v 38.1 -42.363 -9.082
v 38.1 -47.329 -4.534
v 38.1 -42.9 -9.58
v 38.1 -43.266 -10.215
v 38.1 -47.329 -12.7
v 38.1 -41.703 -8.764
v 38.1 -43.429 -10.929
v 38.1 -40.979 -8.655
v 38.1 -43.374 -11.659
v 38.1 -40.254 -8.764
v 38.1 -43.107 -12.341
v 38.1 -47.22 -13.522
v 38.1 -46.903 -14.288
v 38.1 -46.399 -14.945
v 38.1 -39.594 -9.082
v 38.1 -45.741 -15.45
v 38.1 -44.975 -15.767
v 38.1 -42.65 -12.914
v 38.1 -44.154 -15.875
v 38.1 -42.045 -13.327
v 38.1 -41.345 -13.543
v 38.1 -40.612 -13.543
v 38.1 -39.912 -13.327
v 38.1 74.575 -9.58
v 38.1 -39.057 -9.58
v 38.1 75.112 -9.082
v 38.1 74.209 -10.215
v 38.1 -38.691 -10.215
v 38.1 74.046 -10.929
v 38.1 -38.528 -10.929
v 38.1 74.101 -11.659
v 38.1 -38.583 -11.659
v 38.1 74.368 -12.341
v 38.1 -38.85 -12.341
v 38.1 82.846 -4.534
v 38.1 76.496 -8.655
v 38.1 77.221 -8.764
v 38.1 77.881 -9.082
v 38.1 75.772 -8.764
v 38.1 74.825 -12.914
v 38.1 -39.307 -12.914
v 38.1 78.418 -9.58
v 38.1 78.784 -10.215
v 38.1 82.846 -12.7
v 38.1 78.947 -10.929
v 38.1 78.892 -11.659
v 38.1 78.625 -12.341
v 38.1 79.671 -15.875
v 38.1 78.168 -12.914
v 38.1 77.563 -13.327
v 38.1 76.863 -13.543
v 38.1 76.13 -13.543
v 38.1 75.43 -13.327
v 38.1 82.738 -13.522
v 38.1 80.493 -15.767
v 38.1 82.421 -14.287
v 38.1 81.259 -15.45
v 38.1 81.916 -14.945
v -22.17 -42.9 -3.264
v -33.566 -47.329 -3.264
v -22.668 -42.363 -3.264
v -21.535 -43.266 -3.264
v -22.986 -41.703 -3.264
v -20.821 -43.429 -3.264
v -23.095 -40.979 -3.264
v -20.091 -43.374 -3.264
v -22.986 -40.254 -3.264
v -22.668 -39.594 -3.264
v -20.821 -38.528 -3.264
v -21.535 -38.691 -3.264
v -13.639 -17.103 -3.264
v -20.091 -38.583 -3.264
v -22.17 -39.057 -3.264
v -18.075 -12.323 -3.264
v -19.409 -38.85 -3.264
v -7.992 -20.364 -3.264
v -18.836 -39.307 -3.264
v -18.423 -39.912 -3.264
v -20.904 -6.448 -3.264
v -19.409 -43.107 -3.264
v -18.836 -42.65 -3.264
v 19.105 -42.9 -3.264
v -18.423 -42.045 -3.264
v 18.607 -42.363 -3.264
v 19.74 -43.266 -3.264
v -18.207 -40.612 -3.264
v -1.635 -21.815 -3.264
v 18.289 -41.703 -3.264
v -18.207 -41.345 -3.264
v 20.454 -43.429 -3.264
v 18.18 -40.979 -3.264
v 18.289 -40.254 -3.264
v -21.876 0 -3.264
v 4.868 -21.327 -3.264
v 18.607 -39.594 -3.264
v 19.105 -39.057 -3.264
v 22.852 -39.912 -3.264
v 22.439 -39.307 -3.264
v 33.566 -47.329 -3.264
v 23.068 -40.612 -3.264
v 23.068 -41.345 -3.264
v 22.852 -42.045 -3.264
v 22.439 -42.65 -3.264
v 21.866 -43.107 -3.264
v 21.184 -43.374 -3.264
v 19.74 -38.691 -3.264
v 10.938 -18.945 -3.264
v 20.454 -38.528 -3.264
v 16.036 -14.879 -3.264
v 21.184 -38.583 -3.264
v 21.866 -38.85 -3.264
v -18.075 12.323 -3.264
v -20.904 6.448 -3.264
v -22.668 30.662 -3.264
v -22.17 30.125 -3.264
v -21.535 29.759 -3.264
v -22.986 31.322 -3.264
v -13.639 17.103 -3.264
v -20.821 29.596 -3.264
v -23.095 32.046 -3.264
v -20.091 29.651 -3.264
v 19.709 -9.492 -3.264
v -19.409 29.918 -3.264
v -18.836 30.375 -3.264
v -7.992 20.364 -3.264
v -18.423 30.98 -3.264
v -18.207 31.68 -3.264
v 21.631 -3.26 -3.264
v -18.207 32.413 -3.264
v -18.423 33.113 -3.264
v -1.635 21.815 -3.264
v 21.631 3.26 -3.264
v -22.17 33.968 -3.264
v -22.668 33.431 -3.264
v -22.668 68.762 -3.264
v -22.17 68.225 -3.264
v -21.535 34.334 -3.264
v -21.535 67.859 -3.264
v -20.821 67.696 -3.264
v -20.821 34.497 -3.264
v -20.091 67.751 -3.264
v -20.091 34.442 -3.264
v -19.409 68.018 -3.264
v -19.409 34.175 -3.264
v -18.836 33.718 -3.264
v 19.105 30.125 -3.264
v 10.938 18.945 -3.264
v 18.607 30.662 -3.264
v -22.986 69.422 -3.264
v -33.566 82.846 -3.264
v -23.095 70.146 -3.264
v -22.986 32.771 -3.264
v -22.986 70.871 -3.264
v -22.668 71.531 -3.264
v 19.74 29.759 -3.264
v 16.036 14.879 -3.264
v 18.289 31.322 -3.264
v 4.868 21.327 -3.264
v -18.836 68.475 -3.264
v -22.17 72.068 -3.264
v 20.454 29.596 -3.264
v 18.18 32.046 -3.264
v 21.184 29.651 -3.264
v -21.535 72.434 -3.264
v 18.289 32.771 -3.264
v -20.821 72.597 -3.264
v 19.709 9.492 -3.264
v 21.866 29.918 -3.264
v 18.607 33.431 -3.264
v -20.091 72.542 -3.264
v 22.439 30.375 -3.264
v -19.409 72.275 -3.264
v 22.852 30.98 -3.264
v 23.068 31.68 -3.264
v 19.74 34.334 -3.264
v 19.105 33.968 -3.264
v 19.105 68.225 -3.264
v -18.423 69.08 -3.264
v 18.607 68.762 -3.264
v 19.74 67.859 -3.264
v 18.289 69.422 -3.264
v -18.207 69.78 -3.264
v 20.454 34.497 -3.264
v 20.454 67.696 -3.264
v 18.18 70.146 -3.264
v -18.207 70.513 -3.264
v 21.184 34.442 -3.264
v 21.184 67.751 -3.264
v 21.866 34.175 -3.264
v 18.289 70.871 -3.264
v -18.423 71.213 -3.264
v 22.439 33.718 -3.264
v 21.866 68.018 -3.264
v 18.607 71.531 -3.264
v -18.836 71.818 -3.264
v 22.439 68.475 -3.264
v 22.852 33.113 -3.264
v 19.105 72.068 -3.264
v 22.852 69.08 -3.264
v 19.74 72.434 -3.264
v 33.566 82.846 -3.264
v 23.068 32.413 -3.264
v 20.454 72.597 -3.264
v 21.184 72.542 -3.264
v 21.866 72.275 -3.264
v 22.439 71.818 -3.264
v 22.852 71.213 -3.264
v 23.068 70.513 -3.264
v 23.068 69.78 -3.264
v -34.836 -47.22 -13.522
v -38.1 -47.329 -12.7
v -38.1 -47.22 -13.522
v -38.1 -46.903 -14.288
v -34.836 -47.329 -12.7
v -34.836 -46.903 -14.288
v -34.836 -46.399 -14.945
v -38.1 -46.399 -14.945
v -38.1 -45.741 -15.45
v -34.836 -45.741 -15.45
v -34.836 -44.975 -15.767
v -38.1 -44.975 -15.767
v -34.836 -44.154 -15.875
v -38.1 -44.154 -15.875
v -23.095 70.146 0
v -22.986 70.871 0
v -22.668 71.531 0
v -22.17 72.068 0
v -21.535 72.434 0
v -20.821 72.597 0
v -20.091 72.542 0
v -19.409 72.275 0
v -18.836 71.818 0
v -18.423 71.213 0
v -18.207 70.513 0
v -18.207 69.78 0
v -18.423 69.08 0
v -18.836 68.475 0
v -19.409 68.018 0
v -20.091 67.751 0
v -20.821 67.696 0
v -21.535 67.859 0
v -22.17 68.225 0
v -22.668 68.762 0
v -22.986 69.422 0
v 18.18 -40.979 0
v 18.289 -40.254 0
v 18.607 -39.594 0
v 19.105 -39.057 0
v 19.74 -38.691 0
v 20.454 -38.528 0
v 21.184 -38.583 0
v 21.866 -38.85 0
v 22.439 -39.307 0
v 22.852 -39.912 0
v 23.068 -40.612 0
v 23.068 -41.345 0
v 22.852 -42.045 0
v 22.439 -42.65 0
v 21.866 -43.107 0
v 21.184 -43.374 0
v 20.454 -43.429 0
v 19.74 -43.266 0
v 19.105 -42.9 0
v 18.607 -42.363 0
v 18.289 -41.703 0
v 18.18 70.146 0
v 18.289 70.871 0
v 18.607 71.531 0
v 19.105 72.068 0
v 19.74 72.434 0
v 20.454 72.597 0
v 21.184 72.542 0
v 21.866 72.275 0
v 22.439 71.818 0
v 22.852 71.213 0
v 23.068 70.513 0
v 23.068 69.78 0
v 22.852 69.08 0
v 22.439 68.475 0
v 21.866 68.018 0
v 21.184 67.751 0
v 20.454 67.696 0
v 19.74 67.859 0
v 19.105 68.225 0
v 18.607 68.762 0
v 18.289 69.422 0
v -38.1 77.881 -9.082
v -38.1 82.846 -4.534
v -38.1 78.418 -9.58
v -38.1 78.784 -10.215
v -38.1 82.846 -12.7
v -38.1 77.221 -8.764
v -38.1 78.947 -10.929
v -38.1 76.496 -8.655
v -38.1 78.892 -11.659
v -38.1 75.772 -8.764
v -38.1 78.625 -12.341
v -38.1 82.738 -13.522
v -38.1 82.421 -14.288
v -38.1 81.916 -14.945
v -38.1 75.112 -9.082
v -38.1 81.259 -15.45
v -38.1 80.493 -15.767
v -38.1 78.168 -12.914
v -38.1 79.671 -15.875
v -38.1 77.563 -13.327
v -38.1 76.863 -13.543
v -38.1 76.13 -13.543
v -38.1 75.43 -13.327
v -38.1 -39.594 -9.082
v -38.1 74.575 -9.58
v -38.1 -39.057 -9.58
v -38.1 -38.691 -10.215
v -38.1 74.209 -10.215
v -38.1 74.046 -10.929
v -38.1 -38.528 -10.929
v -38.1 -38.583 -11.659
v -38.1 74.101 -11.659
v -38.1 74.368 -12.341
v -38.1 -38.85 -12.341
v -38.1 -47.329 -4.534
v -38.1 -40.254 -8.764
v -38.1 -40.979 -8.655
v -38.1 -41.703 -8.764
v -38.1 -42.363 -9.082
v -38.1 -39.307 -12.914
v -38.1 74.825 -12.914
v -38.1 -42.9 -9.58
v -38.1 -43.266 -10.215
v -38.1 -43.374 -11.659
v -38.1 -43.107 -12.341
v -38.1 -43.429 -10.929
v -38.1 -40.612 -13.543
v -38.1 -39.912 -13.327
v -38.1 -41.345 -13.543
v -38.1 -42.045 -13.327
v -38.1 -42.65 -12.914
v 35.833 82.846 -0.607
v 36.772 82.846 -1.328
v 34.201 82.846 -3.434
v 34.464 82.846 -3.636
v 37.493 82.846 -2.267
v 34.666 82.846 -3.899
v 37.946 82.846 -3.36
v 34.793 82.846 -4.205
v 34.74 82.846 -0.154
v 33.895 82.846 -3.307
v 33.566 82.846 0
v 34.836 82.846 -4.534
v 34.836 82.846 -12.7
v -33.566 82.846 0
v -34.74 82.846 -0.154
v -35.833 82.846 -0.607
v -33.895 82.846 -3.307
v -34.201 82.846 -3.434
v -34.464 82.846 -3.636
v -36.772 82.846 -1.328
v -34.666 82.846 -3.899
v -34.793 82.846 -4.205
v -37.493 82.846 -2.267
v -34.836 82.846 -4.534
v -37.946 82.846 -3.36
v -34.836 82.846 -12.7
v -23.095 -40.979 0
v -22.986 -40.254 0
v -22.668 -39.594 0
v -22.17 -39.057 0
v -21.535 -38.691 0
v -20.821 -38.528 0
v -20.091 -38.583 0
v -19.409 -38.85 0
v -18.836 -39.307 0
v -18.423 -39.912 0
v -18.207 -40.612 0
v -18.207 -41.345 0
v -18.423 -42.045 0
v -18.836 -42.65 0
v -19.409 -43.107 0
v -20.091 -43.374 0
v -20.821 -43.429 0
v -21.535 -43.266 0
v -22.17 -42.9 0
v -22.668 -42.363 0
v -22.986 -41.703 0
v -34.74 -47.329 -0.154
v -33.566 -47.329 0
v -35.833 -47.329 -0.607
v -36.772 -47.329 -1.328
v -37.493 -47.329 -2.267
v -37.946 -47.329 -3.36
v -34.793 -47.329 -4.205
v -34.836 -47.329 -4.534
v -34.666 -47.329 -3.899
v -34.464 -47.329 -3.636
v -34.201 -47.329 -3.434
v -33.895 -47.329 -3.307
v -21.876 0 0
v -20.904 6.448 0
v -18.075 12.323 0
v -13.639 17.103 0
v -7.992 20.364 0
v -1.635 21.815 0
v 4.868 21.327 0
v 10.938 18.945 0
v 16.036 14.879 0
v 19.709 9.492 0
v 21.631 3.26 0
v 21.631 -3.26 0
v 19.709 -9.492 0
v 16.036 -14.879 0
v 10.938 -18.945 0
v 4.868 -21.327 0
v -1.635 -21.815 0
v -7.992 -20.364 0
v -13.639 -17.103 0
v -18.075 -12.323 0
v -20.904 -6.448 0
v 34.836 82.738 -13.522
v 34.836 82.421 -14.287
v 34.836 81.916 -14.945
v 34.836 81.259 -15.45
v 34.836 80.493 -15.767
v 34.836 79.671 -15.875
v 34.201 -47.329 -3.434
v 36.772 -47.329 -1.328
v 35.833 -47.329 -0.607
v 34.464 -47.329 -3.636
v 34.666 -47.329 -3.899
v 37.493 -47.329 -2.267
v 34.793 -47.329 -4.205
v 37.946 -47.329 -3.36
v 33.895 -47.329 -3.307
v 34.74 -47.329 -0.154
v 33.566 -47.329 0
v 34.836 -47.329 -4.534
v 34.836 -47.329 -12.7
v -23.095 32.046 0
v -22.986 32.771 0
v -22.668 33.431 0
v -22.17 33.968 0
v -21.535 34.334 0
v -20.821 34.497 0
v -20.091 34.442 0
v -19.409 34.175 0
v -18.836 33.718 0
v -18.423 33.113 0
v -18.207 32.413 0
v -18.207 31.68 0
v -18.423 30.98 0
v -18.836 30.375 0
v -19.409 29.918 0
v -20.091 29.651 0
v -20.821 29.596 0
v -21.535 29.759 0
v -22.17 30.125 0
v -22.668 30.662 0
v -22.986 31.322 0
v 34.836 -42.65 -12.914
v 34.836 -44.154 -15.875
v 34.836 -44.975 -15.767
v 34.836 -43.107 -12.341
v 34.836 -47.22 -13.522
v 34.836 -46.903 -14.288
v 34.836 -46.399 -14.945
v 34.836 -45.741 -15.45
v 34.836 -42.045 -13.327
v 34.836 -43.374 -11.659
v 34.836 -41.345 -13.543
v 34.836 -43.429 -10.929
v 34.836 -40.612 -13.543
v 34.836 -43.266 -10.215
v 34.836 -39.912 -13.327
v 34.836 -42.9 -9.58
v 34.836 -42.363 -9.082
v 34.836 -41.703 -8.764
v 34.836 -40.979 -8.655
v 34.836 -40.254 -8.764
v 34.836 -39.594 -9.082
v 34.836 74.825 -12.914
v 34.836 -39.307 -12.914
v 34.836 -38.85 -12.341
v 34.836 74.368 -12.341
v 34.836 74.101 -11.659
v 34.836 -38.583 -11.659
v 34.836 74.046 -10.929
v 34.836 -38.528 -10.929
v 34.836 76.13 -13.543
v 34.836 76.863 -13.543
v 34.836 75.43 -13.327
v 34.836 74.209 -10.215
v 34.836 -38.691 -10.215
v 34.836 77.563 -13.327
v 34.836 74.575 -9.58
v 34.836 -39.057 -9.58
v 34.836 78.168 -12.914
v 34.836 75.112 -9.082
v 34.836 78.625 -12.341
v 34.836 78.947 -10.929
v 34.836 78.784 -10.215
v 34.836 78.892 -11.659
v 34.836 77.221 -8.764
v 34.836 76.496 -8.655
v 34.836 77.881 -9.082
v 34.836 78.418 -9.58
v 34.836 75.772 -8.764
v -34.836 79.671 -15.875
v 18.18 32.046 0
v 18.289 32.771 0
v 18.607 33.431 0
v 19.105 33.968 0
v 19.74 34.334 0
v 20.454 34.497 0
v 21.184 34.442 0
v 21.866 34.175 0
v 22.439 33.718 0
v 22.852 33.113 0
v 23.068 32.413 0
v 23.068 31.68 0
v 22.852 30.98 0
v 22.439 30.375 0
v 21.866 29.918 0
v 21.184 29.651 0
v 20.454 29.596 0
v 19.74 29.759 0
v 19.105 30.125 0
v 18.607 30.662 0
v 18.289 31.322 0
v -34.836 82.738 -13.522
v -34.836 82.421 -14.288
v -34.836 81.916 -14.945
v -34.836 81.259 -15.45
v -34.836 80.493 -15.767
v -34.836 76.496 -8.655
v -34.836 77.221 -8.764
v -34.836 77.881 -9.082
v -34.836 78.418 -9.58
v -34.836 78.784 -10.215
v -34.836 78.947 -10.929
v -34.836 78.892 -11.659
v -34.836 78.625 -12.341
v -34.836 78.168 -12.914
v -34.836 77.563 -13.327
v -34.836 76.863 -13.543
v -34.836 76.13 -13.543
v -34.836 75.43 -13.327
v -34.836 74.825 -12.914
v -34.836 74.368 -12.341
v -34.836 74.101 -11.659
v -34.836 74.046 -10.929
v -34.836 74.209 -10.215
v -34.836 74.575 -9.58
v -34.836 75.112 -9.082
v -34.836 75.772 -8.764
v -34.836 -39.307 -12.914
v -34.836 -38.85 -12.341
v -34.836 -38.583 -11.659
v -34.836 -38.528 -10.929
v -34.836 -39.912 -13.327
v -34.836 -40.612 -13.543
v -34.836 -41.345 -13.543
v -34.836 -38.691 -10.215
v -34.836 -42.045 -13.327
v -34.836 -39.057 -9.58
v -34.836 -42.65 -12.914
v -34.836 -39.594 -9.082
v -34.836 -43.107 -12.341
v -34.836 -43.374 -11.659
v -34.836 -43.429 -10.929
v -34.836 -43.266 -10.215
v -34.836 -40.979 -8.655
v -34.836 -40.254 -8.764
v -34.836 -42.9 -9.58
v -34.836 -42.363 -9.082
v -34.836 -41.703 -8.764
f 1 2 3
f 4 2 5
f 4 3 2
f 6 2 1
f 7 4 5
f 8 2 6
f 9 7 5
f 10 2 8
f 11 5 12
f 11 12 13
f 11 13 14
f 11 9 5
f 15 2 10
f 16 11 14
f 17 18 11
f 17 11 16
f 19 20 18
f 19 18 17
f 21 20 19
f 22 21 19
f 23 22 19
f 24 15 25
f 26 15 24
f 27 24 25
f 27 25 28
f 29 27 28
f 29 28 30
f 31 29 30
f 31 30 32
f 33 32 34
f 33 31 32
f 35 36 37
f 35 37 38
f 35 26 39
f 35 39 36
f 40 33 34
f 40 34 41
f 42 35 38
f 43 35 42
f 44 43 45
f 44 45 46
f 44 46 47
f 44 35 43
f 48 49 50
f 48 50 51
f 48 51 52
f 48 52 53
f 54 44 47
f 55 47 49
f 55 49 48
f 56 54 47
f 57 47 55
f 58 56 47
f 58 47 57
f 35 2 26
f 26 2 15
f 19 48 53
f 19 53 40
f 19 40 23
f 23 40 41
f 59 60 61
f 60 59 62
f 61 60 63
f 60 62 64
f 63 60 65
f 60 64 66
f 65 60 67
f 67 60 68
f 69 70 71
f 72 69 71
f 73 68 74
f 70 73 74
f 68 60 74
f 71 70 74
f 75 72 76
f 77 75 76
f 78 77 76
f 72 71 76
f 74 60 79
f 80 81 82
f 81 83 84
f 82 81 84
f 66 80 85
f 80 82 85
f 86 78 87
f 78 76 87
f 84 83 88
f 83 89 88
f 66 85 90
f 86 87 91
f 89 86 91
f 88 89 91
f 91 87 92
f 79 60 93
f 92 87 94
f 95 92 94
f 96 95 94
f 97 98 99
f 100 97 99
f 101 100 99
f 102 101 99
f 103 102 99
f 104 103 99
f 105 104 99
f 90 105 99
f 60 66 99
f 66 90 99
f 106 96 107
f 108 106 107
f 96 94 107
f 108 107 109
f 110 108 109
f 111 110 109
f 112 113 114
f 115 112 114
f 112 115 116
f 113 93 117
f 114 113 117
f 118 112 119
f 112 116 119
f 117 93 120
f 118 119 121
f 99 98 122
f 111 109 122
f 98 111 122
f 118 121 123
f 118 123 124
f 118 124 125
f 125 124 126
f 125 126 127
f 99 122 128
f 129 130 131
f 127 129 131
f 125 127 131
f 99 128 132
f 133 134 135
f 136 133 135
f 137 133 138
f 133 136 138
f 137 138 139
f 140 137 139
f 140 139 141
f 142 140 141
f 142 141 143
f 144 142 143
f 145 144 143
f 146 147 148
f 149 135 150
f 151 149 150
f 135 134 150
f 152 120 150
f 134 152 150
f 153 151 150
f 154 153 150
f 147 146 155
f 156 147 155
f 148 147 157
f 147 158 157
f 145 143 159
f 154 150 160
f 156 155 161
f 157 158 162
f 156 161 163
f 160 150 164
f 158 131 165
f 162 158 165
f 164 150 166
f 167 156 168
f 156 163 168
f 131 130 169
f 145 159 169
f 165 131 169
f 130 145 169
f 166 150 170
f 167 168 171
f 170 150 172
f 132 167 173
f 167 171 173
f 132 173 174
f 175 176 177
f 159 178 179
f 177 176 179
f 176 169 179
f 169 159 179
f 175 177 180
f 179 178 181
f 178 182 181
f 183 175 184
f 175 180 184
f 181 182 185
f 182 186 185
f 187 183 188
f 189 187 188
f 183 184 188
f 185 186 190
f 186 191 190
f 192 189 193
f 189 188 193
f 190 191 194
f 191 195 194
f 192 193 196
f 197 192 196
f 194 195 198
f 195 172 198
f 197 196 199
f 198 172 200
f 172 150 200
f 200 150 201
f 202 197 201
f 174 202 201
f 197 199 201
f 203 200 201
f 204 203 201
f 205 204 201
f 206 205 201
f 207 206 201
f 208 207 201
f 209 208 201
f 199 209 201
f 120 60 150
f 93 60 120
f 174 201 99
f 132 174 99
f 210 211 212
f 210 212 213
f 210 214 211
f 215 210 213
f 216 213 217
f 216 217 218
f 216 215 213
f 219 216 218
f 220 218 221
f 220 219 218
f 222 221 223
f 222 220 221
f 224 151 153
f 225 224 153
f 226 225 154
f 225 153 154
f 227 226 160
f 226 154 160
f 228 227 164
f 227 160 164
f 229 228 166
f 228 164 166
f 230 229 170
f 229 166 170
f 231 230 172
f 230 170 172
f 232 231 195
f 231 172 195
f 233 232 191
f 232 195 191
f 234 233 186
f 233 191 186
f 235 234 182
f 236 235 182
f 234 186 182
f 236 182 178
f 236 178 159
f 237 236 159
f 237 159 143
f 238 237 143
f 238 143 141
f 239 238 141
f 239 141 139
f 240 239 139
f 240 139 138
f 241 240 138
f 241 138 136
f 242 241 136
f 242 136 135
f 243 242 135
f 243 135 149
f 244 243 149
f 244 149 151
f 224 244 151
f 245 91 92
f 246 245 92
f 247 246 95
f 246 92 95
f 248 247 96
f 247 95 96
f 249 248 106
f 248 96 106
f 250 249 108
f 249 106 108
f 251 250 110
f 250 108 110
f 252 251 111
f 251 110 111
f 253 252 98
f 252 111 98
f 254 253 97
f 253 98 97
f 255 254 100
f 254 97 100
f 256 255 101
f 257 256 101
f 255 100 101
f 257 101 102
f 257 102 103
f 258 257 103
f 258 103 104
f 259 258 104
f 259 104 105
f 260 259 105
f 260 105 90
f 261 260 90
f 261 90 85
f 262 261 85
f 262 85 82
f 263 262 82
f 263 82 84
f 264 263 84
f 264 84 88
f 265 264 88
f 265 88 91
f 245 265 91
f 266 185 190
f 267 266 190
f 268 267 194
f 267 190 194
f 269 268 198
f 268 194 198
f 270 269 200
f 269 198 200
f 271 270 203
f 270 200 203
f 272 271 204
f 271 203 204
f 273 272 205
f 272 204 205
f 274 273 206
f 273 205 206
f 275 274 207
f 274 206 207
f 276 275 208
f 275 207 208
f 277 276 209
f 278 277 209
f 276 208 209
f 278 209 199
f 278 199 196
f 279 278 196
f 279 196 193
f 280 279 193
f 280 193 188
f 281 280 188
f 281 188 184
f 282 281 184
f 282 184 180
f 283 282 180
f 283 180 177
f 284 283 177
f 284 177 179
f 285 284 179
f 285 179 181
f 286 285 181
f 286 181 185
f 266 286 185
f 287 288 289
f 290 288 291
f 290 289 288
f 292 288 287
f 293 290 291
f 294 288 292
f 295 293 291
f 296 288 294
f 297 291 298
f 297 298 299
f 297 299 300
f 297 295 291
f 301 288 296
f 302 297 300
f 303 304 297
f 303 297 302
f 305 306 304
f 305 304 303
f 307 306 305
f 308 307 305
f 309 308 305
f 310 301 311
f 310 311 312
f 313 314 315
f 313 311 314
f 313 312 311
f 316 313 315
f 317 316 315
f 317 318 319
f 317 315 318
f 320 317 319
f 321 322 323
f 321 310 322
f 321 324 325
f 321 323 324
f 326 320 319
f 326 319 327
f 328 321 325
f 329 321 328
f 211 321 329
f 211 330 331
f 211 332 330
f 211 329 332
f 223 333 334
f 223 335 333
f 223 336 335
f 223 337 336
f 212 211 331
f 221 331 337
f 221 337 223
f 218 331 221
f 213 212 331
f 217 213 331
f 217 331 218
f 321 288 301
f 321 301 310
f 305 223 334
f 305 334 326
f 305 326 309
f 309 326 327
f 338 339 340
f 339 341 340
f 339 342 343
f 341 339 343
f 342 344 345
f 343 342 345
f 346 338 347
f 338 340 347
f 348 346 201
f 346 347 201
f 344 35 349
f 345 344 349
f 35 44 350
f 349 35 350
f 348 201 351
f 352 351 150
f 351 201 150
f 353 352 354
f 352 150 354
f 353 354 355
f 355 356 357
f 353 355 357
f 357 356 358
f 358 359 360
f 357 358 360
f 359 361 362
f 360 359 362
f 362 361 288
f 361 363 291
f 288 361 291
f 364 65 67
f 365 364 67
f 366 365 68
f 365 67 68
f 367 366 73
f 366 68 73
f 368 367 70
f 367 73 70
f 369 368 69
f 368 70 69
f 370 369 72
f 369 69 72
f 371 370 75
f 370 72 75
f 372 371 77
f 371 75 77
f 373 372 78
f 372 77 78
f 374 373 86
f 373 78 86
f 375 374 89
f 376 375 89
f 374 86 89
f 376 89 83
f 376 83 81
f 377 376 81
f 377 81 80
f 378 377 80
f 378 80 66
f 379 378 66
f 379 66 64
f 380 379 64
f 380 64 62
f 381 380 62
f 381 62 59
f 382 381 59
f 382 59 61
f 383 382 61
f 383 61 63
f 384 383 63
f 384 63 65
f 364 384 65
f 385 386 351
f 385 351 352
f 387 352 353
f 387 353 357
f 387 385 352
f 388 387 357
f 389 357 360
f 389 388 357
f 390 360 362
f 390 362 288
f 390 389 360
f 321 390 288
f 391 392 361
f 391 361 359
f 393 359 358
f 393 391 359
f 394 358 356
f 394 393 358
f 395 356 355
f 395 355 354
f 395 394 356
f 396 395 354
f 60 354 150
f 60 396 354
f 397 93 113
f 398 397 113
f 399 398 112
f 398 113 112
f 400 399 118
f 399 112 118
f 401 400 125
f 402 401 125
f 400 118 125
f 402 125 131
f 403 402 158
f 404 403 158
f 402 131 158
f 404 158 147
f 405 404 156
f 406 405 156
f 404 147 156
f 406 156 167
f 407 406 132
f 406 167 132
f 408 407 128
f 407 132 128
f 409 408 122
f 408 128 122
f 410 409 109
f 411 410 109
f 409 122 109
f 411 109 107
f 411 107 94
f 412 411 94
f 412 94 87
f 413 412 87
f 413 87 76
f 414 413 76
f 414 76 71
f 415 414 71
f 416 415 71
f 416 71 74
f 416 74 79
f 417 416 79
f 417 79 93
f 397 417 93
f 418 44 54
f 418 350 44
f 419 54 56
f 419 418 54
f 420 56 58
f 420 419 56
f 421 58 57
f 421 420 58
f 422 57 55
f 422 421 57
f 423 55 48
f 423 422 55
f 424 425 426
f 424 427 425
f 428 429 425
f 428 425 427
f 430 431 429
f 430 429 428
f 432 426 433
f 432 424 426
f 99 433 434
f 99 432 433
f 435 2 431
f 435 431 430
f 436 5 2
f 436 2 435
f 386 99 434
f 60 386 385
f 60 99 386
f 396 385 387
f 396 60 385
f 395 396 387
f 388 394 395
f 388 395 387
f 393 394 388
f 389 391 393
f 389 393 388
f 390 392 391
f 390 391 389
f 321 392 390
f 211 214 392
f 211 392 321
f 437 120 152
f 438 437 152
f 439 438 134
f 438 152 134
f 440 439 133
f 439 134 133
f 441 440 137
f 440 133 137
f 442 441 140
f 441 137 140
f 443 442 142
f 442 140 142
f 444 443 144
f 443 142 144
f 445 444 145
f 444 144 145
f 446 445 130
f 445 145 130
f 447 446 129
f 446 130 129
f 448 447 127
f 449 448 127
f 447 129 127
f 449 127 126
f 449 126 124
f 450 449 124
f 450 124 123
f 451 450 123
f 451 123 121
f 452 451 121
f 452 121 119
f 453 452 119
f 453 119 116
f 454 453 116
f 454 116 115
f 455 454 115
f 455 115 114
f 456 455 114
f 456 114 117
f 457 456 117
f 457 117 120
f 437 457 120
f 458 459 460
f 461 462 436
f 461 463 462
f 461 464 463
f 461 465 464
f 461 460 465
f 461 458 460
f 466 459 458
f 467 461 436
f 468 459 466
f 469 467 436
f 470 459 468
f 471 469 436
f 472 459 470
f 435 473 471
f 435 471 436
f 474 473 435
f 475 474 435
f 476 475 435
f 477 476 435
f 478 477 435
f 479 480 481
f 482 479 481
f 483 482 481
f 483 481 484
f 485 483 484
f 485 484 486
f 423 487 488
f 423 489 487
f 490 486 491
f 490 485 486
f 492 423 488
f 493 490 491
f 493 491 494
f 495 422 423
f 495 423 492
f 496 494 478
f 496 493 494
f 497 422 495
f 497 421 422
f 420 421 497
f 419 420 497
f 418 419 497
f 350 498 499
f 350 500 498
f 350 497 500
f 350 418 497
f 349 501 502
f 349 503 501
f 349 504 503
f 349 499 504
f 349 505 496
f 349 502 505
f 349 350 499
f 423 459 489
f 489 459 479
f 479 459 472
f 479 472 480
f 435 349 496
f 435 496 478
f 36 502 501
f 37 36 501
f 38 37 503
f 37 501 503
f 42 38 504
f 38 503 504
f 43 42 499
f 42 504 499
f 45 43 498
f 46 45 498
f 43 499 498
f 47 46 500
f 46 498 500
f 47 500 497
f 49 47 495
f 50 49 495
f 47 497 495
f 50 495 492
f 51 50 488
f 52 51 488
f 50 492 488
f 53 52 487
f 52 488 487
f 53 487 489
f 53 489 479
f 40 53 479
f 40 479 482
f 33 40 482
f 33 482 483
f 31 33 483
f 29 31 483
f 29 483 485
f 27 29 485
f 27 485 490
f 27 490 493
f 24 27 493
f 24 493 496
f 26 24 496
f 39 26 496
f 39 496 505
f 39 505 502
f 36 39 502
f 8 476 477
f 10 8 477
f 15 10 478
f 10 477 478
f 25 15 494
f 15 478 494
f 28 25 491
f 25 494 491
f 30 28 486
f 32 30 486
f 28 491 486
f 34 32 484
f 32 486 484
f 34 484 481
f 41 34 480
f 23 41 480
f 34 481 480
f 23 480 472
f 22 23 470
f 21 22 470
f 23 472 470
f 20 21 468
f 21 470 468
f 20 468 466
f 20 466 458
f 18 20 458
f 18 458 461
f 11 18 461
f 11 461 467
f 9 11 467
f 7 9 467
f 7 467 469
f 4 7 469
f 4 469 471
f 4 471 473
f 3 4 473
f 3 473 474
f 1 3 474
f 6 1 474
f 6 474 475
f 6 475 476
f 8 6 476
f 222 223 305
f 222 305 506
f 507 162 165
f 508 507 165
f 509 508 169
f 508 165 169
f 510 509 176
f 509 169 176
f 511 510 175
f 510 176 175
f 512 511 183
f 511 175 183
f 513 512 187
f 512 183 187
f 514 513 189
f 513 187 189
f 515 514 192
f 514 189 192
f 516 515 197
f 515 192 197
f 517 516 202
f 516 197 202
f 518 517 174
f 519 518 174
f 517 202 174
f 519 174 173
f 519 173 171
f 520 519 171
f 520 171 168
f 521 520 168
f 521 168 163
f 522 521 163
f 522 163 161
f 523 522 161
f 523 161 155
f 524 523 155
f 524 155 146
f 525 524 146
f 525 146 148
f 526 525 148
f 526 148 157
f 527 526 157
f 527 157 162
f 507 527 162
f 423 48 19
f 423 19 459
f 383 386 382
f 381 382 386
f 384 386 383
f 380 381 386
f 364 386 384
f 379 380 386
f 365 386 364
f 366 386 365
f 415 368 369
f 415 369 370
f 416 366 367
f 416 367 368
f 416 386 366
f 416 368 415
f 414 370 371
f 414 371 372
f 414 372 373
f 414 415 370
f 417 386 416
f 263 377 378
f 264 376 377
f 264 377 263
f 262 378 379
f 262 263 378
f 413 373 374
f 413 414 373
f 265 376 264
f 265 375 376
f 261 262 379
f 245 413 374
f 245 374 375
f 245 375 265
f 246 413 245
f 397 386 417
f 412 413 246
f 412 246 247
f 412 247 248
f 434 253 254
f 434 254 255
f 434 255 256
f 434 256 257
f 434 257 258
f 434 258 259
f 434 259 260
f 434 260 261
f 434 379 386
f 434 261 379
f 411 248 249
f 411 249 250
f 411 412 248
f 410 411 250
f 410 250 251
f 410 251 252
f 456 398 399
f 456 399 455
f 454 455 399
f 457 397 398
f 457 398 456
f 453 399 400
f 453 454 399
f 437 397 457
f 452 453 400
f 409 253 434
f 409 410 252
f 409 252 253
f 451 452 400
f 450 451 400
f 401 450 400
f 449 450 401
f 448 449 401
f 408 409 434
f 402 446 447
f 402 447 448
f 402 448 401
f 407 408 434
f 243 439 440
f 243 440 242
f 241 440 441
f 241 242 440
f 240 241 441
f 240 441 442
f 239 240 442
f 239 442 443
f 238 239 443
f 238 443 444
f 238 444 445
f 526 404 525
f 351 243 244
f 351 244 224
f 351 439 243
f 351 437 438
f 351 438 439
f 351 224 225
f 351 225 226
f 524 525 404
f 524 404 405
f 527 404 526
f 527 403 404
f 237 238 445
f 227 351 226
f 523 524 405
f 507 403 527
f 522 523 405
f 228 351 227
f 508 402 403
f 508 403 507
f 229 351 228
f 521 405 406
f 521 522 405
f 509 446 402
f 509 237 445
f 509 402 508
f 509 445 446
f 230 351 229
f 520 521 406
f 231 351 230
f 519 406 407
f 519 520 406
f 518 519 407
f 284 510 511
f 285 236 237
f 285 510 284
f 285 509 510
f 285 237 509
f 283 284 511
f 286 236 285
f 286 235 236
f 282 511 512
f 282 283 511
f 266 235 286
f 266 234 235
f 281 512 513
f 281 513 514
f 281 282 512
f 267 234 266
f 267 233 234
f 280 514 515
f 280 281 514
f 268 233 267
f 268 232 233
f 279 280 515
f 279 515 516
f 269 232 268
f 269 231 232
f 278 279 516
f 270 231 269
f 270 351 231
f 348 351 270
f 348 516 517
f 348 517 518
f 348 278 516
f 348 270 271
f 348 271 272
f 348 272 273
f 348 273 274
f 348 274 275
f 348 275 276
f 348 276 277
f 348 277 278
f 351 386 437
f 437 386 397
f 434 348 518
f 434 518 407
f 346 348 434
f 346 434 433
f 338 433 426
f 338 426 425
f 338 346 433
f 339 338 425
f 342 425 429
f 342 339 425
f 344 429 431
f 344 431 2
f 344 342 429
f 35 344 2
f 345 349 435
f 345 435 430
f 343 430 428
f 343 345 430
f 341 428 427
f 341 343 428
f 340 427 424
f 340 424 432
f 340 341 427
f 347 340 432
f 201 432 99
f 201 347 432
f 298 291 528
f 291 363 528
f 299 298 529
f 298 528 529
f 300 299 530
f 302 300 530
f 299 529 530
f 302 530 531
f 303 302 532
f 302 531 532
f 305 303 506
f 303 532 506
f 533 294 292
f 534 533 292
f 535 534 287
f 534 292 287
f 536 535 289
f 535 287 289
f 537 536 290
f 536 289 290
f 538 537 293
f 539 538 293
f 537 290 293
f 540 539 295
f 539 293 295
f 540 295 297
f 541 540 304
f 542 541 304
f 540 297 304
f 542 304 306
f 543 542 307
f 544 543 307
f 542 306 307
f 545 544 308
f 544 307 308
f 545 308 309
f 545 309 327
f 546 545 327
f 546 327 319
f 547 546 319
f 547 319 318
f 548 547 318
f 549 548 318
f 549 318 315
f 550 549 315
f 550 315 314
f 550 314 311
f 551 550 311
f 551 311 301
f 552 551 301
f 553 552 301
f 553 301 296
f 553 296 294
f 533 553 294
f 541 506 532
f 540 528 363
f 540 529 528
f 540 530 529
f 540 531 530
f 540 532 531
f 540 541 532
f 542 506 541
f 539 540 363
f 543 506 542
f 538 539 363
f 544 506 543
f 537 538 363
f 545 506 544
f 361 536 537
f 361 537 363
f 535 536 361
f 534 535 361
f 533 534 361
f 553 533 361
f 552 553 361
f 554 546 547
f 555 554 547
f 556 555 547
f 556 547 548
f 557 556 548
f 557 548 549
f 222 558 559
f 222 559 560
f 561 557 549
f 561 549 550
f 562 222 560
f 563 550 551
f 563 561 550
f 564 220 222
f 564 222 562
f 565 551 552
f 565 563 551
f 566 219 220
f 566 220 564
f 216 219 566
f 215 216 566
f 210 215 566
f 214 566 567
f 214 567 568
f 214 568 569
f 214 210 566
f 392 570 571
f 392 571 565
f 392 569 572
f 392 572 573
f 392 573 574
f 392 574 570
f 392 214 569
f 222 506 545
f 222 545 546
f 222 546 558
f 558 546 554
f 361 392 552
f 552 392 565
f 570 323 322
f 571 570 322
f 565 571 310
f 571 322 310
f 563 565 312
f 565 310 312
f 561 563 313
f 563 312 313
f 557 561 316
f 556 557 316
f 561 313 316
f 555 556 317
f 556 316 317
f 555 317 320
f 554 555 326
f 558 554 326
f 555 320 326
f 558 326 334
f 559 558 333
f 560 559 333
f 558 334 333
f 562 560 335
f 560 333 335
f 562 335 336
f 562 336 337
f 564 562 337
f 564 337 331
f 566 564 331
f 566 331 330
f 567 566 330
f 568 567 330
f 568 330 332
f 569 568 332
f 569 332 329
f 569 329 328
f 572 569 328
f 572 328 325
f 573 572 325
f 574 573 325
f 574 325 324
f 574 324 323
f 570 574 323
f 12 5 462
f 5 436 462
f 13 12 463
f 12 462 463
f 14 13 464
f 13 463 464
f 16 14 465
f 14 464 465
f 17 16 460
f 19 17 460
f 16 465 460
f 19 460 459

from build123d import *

# Parameters (mm, degrees)
SKETCH1_W                      = 76.2
SKETCH1_H                      = 130.175
BASE_FLANGE1_DEPTH             = 3.2639
EDGE_FLANGE1_STRIP_W           = 15.5956
EDGE_FLANGE1_STRIP_H           = 3.2639
EDGE_FLANGE1_STRIP_CUT_DEPTH   = 130.175
EDGE_FLANGE1_STRIP_2_W         = 15.5956
EDGE_FLANGE1_STRIP_2_H         = 3.2639
EDGE_FLANGE1_STRIP_CUT_2_DEPTH = 130.175
EDGE_FLANGE1_DEPTH             = 130.175
EDGE_FLANGE1_BEND_DEPTH        = 130.175
F_10_0_1935_DIAMETER_HOLE1_D   = 4.9149
SKETCH32_R                     = 21.87575
CUT_EXTRUDE1_DEPTH             = 93.055303045
F_10_0_1935_DIAMETER_HOLE2_D   = 4.9149
FILLET1_R                      = 3.175
F_10_0_1935_DIAMETER_HOLE3_D   = 4.9149


# Sheet-metal steps are written as plain solids
with BuildPart() as part:
    # Sketch1 → Base-Flange1 (new body)
    with BuildSketch(Plane.XY):
        with Locations((0, 17.758918)):
            Rectangle(SKETCH1_W, SKETCH1_H)
    extrude(amount=-BASE_FLANGE1_DEPTH)

    # Edge-Flange1 strip (across the edge) → Edge-Flange1 strip cut (cut)
    with BuildSketch(Plane(origin=(38.1, 82.846418, -3.2639), x_dir=(-1, 0, 0), z_dir=(0, -1, 0))):
        with Locations((-3.2639, -1.63195)):
            Rectangle(EDGE_FLANGE1_STRIP_W, EDGE_FLANGE1_STRIP_H)
    extrude(amount=EDGE_FLANGE1_STRIP_CUT_DEPTH, mode=Mode.SUBTRACT)

    # Edge-Flange1 strip 2 (across the edge) → Edge-Flange1 strip cut 2 (cut)
    with BuildSketch(Plane(origin=(-38.1, -47.328582, -3.2639), x_dir=(1, 0, 0), z_dir=(0, 1, 0))):
        with Locations((-3.2639, -1.63195)):
            Rectangle(EDGE_FLANGE1_STRIP_2_W, EDGE_FLANGE1_STRIP_2_H)
    extrude(amount=EDGE_FLANGE1_STRIP_CUT_2_DEPTH, mode=Mode.SUBTRACT)

    # Edge-Flange1 section (across the edge) → Edge-Flange1 (add)
    with BuildSketch(Plane(origin=(38.1, 82.846418, -3.2639), x_dir=(-1, 0, 0), z_dir=(0, -1, 0))):
        with BuildLine():
            Line((0, 1.27), (0, 12.6111))
            Line((0, 12.6111), (3.2639, 12.6111))
            Line((3.2639, 12.6111), (3.2639, 1.27))
            ThreePointArc((3.2639, 1.27), (3.635874388, 0.371974388), (4.5339, 0))
            Line((4.5339, 0), (4.5339, -3.2639))
            ThreePointArc((4.5339, -3.2639), (1.327948565, -1.935951435), (0, 1.27))
        make_face()
    extrude(amount=EDGE_FLANGE1_DEPTH)

    # Edge-Flange1 section 2 (across the edge) → Edge-Flange1 bend (add)
    with BuildSketch(Plane(origin=(-38.1, -47.328582, -3.2639), x_dir=(1, 0, 0), z_dir=(0, 1, 0))):
        with BuildLine():
            Line((0, 1.27), (0, 12.6111))
            Line((0, 12.6111), (3.2639, 12.6111))
            Line((3.2639, 12.6111), (3.2639, 1.27))
            ThreePointArc((3.2639, 1.27), (3.635874388, 0.371974388), (4.5339, 0))
            Line((4.5339, 0), (4.5339, -3.2639))
            ThreePointArc((4.5339, -3.2639), (1.327948565, -1.935951435), (0, 1.27))
        make_face()
    extrude(amount=EDGE_FLANGE1_BEND_DEPTH)

    # #10 (0.1935) Diameter Hole1 (through all)
    with Locations(Plane(origin=(38.1, 0, 0), x_dir=(0, 0, -1), z_dir=(1, 0, 0))):
        with Locations((11.1125, 76.496418), (11.1125, -40.978582)):
            Hole(F_10_0_1935_DIAMETER_HOLE1_D / 2)

    # Sketch32 → Cut-Extrude1 (cut, through all)
    with BuildSketch(Plane(origin=(0, 0, -3.2639), x_dir=(-1, 0, 0), z_dir=(0, 0, -1))):
        Circle(SKETCH32_R)
    extrude(amount=-CUT_EXTRUDE1_DEPTH, mode=Mode.SUBTRACT)

    # #10 (0.1935) Diameter Hole2 (through all)
    with Locations(Plane.XY):
        with Locations((-20.6375, -40.978582), (20.6375, -40.978582)):
            Hole(F_10_0_1935_DIAMETER_HOLE2_D / 2)

    # Fillet1
    fillet1_edges = [part.edges().sort_by_distance(p)[0] for p in [
        (36.46805, 82.846418, -15.875),
        (36.46805, -47.328582, -15.875),
        (-36.46805, -47.328582, -15.875),
        (-36.46805, 82.846418, -15.875),
    ]]
    fillet(fillet1_edges, radius=FILLET1_R)

    # #10 (0.1935) Diameter Hole3 (through all)
    with Locations(Plane.XY):
        with Locations((-20.6375, 70.146418), (20.6375, 70.146418), (20.6375, 32.046418), (-20.6375, 32.046418)):
            Hole(F_10_0_1935_DIAMETER_HOLE3_D / 2)


solid = part.part
